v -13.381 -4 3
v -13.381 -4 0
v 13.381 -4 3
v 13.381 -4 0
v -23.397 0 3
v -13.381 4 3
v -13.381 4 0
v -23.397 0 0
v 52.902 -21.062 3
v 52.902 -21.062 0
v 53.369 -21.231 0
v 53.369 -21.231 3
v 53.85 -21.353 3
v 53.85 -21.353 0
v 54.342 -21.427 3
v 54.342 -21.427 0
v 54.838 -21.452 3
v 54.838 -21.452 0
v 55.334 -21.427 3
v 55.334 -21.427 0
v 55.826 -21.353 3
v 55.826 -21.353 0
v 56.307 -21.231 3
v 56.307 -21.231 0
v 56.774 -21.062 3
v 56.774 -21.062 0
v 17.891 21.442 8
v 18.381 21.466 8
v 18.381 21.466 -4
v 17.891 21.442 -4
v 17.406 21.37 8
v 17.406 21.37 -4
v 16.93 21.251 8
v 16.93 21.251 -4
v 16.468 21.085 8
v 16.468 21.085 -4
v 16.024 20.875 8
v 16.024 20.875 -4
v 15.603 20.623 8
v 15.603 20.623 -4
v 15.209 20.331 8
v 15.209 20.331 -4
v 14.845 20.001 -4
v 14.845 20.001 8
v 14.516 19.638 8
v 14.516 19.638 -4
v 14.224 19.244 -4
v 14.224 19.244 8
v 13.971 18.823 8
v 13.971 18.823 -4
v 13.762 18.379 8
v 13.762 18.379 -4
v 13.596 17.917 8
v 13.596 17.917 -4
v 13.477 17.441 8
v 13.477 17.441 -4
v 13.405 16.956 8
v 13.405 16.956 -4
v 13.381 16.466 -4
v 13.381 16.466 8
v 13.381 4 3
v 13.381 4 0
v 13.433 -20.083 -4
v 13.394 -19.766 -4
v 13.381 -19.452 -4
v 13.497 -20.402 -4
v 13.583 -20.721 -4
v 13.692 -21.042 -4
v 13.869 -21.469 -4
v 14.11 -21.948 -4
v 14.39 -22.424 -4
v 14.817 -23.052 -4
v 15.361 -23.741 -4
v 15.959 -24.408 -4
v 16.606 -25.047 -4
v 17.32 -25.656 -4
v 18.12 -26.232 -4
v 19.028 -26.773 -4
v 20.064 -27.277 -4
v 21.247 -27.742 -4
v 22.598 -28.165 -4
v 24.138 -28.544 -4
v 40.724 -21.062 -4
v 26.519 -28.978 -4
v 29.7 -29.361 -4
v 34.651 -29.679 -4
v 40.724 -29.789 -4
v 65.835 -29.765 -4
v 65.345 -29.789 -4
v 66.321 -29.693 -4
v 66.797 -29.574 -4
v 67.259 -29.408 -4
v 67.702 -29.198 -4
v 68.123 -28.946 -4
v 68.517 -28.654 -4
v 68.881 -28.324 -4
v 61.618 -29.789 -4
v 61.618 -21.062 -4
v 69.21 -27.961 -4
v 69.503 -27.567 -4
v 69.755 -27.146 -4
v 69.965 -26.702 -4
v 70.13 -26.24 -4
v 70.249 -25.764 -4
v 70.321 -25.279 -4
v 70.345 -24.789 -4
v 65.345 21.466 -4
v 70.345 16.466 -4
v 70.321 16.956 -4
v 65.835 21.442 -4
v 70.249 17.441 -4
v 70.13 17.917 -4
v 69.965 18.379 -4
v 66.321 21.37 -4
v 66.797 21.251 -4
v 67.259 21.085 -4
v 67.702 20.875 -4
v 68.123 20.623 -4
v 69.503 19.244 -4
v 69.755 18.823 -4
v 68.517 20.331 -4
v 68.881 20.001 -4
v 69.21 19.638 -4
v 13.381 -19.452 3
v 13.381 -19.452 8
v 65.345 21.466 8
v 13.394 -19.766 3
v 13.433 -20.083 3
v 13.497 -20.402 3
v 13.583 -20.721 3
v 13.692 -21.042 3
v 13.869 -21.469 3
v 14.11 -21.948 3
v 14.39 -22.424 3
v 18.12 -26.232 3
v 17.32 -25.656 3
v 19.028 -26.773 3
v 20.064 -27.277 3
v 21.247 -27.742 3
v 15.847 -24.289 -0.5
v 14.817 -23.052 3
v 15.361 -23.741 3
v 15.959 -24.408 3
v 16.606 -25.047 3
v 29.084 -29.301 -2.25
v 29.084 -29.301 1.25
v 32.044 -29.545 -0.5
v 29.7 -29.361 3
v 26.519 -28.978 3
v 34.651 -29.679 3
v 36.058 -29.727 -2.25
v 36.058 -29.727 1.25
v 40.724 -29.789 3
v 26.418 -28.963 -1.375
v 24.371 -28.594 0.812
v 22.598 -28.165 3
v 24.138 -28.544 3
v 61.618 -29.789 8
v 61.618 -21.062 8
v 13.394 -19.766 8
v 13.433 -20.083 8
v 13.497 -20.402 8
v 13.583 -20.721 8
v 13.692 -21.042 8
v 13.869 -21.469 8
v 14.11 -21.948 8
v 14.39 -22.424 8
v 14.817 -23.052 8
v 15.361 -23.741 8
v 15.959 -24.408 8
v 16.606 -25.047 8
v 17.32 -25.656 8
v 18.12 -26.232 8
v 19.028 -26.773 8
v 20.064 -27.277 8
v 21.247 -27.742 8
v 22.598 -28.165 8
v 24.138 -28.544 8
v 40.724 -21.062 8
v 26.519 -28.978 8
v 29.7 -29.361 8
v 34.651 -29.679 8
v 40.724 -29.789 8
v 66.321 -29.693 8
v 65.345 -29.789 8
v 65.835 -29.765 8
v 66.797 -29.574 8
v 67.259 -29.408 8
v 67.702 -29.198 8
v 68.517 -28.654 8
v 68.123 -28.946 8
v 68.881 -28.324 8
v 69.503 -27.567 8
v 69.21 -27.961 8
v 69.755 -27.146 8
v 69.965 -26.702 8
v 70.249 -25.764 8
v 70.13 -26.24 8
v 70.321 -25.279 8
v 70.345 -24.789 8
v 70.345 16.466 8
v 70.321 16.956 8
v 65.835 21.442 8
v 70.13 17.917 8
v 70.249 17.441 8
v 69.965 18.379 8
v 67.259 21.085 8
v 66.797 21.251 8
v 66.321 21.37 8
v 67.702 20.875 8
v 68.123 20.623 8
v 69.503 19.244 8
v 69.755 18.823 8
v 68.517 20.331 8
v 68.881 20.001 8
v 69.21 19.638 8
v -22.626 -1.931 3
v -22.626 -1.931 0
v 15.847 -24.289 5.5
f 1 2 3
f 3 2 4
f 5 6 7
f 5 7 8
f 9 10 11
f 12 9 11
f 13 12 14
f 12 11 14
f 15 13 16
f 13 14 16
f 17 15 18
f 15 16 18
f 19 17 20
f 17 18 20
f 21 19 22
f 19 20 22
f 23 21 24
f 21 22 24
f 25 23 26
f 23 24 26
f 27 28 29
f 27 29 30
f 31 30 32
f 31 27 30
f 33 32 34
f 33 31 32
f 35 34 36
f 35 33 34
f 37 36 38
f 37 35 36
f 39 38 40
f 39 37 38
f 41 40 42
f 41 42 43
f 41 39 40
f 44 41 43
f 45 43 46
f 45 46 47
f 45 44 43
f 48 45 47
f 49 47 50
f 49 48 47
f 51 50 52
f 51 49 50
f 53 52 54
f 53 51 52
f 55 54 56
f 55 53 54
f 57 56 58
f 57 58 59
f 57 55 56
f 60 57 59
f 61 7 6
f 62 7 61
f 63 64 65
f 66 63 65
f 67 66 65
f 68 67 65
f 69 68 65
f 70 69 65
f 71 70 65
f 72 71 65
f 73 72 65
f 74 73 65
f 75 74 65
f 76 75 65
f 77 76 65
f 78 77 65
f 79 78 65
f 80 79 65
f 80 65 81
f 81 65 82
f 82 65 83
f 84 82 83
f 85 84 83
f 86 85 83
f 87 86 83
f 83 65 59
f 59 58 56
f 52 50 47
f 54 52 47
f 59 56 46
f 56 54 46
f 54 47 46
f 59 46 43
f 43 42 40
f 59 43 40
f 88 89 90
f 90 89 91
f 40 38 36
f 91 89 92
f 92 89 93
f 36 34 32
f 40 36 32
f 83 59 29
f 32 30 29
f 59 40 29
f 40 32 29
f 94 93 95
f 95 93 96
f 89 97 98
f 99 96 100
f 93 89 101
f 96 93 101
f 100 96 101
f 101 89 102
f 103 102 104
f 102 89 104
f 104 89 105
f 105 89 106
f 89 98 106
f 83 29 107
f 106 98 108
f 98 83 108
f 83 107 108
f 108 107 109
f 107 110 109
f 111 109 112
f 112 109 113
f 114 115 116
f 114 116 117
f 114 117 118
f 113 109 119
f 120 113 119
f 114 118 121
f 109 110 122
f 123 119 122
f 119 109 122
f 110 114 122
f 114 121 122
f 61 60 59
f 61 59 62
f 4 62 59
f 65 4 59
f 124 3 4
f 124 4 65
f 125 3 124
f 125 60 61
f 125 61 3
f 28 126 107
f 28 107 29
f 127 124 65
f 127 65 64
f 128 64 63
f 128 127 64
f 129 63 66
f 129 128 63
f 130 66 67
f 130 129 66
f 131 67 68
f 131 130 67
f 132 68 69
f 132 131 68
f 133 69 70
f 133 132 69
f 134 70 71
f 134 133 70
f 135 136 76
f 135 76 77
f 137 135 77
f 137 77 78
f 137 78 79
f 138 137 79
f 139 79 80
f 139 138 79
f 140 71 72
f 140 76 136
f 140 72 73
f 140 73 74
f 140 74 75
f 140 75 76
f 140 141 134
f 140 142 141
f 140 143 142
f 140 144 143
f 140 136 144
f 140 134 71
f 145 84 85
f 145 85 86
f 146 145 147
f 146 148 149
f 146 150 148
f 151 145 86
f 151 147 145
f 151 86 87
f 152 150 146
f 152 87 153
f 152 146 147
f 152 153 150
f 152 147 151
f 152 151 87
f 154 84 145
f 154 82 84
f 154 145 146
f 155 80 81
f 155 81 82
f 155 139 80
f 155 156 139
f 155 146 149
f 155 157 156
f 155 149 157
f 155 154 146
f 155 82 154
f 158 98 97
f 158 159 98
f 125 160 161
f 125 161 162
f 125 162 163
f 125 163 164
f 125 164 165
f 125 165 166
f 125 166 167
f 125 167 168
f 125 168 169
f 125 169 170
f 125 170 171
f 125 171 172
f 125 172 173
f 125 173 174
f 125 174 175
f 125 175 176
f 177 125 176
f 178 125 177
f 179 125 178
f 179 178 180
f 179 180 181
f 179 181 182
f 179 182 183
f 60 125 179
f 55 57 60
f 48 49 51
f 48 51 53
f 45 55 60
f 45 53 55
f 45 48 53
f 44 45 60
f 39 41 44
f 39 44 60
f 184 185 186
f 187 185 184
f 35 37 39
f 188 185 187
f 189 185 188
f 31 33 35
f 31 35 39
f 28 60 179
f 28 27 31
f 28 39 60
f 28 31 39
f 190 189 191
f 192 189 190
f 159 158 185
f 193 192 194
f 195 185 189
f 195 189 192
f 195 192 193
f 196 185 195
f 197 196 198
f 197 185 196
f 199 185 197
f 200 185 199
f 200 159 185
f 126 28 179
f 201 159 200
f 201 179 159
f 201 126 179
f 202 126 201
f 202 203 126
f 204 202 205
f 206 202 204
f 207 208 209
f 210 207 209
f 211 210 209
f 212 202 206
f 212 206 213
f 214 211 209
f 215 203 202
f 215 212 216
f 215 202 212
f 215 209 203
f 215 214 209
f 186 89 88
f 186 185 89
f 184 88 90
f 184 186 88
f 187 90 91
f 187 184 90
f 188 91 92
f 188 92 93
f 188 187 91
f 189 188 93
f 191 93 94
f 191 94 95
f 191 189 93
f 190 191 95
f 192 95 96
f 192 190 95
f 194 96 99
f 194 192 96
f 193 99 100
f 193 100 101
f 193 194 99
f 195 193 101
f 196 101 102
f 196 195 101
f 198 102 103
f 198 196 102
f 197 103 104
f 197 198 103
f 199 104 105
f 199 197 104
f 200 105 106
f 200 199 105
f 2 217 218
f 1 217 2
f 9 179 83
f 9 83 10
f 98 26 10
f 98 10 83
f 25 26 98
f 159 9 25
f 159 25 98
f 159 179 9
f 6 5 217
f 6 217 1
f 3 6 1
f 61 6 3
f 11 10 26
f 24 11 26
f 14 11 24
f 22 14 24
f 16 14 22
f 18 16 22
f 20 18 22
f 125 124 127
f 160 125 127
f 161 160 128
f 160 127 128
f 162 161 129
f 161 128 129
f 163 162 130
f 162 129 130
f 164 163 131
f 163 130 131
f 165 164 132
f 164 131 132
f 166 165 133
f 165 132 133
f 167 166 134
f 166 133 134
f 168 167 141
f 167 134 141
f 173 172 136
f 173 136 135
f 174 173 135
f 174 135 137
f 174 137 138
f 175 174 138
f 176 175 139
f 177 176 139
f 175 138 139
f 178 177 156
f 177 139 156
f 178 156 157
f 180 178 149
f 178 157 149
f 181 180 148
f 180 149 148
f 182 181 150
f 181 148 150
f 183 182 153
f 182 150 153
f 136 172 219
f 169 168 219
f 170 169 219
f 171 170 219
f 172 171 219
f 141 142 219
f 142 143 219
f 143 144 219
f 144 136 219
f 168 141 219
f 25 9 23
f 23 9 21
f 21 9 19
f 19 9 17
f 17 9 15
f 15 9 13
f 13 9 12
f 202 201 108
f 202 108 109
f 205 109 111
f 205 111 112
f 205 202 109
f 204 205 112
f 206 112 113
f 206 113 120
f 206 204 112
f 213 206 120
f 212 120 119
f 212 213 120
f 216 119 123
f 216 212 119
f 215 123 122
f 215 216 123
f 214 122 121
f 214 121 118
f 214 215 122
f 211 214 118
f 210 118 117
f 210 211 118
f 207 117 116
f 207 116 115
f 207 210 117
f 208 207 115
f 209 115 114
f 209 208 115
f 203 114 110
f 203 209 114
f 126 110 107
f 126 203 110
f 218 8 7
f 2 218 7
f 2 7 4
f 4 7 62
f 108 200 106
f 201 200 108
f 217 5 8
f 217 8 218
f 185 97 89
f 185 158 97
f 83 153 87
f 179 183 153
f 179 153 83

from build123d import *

# Parameters (mm, degrees)
F0_W          = 26.7619055467
F0_H          = 8
F0_W_2        = 2.3985728621
F0_H_2        = 18.6882130802
F1_DEPTH      = 3
F3_DEPTH      = 5
F3_DEPTH_BACK = 7
F5_DEPTH      = 3


with BuildPart() as f1:
    # F0 (on Top) → F1 (new body)
    with BuildSketch(Plane.XY):
        Rectangle(F0_W, F0_H)
        with BuildLine():
            Line((52.8560965785, 21.0423569454), (13.3809527733, 4))
            Line((13.3809527733, 4), (13.3809527733, -4))
            Line((13.3809527733, -4), (52.8560965785, -21.0423569454))
            ThreePointArc((52.8560965785, -21.0423569454), (57.5848119408, -20.6297501175), (59.837911278, -16.4518874164))
            add(Edge.make_bspline(
                [(59.837911278, 16.4518874164), (61.2770561129, 11.6345916109), (64.1553457826, 0), (61.2770561129, -11.6345916109), (59.837911278, -16.4518874164)],
                knots=[0, 0, 0, 0, 0.5, 1, 1, 1, 1], degree=3))
            ThreePointArc((59.837911278, 16.4518874164), (57.5848119408, 20.6297501175), (52.8560965785, 21.0423569454))
        make_face()
        with Locations((55.1606826484, 0)):
            Rectangle(F0_W_2, F0_H_2, mode=Mode.SUBTRACT)
    extrude(amount=F1_DEPTH)

    # F2 (on face) → F3 (join, two sides)
    with BuildSketch(Plane.XY.offset(3)) as f3_sk:
        with BuildLine():
            ThreePointArc((65.3452423009, -29.7888193663), (68.8807762069, -28.3243532722), (70.3452423009, -24.7888193663))
            Line((70.3452423009, -24.7888193663), (70.3452423009, 16.4658156037))
            ThreePointArc((70.3452423009, 16.4658156037), (68.8807762069, 20.0013495097), (65.3452423009, 21.4658156037))
            Line((65.3452423009, 21.4658156037), (18.3809527733, 21.4658156037))
            ThreePointArc((18.3809527733, 21.4658156037), (14.8454188674, 20.0013495097), (13.3809527733, 16.4658156037))
            Line((13.3809527733, 16.4658156037), (13.3809527733, -19.452085589))
            add(Edge.make_bspline(
                [(13.3809527733, -19.452085589), (13.3809527733, -21.0615276884), (16.7556266537, -26.514923688), (23.4789476527, -29.7888193663), (40.723754061, -29.7888193663)],
                knots=[0, 0, 0, 0, 0.3158208681, 1, 1, 1, 1], degree=3))
            Line((40.723754061, -29.7888193663), (40.723754061, -21.0617277771))
            Line((40.723754061, -21.0617277771), (61.6181507117, -21.0617277771))
            Line((61.6181507117, -21.0617277771), (61.6181507117, -29.7888193663))
            Line((61.6181507117, -29.7888193663), (65.3452423009, -29.7888193663))
        make_face()
    extrude(amount=F3_DEPTH)
    extrude(f3_sk.sketch, amount=-F3_DEPTH_BACK)

    # F4 (on face) → F5 (join, through all)
    with BuildSketch(Plane.XY.offset(3)):
        Polygon((-13.3809527733, -4), (-13.3809527733, 4), (-23.397071287, 0), (-22.625775183, -1.9313482969), align=None)
    extrude(amount=-F5_DEPTH)


solid = f1.part
